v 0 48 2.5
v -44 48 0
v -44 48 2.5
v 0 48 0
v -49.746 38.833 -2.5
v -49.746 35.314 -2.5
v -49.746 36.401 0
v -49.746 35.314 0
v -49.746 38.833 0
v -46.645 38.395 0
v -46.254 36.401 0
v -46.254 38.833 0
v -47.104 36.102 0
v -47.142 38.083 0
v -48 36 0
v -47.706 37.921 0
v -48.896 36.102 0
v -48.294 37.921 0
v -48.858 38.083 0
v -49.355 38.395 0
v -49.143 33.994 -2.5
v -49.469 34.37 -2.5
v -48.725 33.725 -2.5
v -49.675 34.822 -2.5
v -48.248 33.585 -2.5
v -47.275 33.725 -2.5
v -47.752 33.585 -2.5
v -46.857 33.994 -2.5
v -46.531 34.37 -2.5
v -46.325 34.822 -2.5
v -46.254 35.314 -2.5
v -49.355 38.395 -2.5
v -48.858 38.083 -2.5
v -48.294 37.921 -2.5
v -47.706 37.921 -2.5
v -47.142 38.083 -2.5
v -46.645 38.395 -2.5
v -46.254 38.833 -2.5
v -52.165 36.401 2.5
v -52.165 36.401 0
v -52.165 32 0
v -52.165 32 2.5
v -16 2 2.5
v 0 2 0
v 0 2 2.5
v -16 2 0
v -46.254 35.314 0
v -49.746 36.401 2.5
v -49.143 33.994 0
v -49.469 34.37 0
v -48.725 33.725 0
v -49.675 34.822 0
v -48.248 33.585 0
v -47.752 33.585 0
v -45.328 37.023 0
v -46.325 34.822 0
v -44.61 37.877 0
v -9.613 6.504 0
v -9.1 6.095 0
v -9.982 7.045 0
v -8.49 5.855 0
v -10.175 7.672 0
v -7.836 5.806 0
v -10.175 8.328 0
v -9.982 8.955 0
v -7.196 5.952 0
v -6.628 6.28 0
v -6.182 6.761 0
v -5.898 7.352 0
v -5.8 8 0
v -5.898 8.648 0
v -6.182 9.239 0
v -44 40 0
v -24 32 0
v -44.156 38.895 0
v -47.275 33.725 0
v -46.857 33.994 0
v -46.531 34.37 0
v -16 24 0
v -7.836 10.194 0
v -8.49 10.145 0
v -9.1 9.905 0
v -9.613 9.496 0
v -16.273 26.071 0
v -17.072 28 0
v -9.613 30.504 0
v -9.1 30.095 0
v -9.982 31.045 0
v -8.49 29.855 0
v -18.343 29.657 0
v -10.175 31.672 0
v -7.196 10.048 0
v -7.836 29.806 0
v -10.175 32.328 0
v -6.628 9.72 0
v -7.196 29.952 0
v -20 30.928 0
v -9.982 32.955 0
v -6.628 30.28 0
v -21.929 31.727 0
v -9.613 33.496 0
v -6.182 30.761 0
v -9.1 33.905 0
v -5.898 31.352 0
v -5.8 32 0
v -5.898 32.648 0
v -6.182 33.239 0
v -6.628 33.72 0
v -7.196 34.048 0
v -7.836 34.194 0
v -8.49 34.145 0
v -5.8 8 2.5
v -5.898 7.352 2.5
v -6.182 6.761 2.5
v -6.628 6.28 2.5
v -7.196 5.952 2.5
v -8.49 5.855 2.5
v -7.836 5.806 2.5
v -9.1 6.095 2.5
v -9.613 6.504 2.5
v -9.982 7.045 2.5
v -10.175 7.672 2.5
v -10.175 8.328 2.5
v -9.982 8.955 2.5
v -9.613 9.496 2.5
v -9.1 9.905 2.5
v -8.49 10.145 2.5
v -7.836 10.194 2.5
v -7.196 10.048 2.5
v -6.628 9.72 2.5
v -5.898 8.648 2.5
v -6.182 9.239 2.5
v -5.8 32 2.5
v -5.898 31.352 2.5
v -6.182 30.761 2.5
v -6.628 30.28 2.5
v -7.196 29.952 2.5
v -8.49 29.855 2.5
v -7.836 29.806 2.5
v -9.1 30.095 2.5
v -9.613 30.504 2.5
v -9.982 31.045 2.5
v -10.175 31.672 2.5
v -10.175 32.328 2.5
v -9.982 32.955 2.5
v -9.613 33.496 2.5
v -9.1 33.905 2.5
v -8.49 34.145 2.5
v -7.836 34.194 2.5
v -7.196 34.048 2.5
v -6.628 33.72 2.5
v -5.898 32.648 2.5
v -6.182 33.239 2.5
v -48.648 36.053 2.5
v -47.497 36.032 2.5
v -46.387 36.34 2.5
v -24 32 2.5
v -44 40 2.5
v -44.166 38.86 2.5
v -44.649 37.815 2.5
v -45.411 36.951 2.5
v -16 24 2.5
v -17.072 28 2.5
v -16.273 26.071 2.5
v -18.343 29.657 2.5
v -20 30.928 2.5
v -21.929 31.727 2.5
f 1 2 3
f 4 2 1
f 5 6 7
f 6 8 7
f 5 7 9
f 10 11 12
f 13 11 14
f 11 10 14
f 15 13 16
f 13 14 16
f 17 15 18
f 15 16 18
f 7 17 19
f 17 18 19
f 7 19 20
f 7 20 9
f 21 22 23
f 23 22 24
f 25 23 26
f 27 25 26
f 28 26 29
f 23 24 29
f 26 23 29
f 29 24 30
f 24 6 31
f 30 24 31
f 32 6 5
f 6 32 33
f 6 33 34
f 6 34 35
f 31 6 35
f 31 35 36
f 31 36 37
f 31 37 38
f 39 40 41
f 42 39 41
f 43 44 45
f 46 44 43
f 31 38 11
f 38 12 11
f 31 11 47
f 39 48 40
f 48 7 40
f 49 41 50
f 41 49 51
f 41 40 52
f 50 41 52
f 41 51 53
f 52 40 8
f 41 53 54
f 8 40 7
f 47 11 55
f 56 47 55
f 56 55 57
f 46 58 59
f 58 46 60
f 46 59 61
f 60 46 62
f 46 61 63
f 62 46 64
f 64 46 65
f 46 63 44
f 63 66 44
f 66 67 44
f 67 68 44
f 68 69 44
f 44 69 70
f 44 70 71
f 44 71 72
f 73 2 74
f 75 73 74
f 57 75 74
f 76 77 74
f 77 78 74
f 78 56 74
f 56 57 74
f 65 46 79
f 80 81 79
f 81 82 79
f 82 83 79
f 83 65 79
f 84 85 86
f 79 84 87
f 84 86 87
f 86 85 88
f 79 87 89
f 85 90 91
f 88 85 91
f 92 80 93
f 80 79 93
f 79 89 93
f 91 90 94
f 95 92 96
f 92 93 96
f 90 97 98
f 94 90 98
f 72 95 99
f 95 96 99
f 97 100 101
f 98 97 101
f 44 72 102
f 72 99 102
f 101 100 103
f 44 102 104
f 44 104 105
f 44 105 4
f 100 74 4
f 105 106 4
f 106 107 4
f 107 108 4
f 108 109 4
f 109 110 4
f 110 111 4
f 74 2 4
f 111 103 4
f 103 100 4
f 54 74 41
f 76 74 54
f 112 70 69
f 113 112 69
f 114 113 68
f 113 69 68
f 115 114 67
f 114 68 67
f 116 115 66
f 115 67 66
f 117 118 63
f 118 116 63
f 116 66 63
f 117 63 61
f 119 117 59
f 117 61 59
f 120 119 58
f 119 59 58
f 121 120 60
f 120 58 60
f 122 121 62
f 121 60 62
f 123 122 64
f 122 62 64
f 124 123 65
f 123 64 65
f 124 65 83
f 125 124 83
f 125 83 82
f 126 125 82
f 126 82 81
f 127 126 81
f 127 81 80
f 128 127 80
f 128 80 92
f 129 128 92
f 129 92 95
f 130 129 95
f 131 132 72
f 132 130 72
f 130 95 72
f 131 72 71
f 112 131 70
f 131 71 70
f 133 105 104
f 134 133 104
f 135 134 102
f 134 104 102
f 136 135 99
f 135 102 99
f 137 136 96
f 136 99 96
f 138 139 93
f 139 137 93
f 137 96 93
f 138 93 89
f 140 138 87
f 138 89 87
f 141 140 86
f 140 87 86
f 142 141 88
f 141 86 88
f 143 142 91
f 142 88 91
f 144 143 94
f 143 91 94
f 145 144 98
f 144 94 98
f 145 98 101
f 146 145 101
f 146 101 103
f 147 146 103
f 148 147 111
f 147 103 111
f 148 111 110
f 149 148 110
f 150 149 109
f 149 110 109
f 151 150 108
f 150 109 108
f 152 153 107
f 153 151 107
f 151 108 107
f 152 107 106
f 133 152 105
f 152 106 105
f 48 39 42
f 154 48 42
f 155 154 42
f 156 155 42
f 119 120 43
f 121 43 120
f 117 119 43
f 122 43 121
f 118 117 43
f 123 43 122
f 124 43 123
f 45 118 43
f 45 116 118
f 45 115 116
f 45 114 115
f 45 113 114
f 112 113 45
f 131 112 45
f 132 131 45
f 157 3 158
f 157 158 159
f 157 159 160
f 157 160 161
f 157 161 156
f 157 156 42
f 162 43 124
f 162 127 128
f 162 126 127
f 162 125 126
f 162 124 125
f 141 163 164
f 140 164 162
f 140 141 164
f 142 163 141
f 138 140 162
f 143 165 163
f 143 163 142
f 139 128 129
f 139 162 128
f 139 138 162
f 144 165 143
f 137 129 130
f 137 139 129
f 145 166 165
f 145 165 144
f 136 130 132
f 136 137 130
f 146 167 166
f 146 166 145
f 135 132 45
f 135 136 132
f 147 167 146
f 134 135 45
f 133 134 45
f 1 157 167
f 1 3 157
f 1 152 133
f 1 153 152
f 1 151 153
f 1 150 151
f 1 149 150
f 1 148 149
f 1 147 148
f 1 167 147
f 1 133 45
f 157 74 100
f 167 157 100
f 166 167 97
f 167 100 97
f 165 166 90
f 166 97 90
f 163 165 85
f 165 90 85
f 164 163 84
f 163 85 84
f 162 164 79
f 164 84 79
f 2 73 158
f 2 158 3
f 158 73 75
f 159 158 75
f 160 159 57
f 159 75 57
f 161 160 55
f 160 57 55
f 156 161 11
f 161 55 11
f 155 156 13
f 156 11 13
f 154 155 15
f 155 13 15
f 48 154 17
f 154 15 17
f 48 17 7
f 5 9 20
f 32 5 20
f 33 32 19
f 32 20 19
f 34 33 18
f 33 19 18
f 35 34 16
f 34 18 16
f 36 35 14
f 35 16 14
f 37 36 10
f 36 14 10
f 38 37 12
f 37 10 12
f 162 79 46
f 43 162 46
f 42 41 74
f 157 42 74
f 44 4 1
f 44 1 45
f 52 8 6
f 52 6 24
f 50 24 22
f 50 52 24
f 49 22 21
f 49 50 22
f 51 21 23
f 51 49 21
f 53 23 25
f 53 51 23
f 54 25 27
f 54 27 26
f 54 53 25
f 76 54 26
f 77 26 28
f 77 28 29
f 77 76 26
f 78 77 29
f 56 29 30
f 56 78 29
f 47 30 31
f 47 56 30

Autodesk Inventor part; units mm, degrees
ref_plane "YZ Plane" through (0, 0, 0) normal (1, 0, 0) x (0, 1, 0)
ref_plane "Work Plane5" through (0, 0, 0) normal (0, 0, 1) x (1, 0, 0)
sketch "Sketch1" plane through (0, 0, 0) normal (0, 0, 1) x (1, 0, 0)
  arc A0 (-50, 35.3137) -> (-46, 35.3137) centre (-48, 35.3137) ccw construction
  arc A1 (-46, 40) -> (-50, 40) centre (-48, 40) ccw construction
  line L0 (-50, 35.3137) -> (-50, 40) construction
  line L1 (-46, 40) -> (-46, 35.3137) construction
  line L2 (-46.254, 38.8332) -> (-46.254, 35.3137)
  arc A2 (-49.746, 35.3137) -> (-46.254, 35.3137) centre (-48, 35.3137) ccw
  line L3 (-49.746, 35.3137) -> (-49.746, 38.8332)
  arc A3 (-49.746, 38.8332) -> (-46.254, 38.8332) centre (-48, 40) ccw
  point P0 (0, 0)
  dimension "d1" = 4.2
extrude "Extrusion1" add sketch "Sketch1" against normal blind 2.5
ref_plane "Work Plane6" through (0, 0, 0) normal (0, 0, 1) x (1, 0, 0)
sketch "Sketch2" plane through (0, 0, 0) normal (0, 0, 1) x (1, 0, 0)
  line L0 (-52.1646, 48) -> (0, 48)
  line L1 (0, 48) -> (0, 2)
  arc A0 (-16, 24) -> (-24, 32) centre (-24, 24) ccw
  circle A1 centre (-8, 8) radius 2.2
  circle A2 centre (-8, 32) radius 2.2
  line L2 (-52.1646, 32) -> (-24, 32)
  line L3 (-16, 24) -> (-16, 2)
  line L4 (0, 2) -> (-16, 2)
  arc A3 (-49.746, 38.8332) -> (-46.254, 38.8332) centre (-48, 40) ccw projected
  line L5 (-52.1646, 48) -> (-52.1646, 32)
  line L6 (-52.1646, 48) -> (-36.1646, 48) construction
  point P0 (-54, 48)
  dimension "d7" = 4.4
  dimension "d8" = 4.4
  dimension "d9" = 24
  dimension "d22" = 48
  dimension "d23" = 90
  dimension "d24" = 46
  dimension "d25" = 16
  dimension "d26" = 8
  dimension "d27" = 8
extrude "Extrusion2" add sketch "Sketch2" along normal blind 2.5
sketch "Sketch6" plane through (0, 0, 0) normal (0, 0, -1) x (-1, 0, 0)
  arc A0 (46.254, 38.8332) -> (49.746, 38.8332) centre (48, 40) ccw projected
  arc A1 (44, 40) -> (49.746, 36.4012) centre (48, 40) ccw
  line L0 (52.1646, 48) -> (52.1646, 32) projected
  line L1 (49.746, 35.3137) -> (49.746, 38.8332) projected
  line L2 (49.746, 36.4012) -> (52.1646, 36.4012)
  line L3 (52.1646, 36.4012) -> (52.1646, 44)
  line L4 (44, 40) -> (44, 48)
  line L5 (0, 48) -> (52.1646, 48) projected
  line L6 (44, 48) -> (52.1646, 48)
  line L7 (52.1646, 44) -> (52.1646, 48)
  point P0 (0, 0)
  dimension "d31" = 8
extrude "Extrusion6" cut sketch "Sketch6" against normal up to surface (2.5 mm away)
properties part number "Odometry stop left"
